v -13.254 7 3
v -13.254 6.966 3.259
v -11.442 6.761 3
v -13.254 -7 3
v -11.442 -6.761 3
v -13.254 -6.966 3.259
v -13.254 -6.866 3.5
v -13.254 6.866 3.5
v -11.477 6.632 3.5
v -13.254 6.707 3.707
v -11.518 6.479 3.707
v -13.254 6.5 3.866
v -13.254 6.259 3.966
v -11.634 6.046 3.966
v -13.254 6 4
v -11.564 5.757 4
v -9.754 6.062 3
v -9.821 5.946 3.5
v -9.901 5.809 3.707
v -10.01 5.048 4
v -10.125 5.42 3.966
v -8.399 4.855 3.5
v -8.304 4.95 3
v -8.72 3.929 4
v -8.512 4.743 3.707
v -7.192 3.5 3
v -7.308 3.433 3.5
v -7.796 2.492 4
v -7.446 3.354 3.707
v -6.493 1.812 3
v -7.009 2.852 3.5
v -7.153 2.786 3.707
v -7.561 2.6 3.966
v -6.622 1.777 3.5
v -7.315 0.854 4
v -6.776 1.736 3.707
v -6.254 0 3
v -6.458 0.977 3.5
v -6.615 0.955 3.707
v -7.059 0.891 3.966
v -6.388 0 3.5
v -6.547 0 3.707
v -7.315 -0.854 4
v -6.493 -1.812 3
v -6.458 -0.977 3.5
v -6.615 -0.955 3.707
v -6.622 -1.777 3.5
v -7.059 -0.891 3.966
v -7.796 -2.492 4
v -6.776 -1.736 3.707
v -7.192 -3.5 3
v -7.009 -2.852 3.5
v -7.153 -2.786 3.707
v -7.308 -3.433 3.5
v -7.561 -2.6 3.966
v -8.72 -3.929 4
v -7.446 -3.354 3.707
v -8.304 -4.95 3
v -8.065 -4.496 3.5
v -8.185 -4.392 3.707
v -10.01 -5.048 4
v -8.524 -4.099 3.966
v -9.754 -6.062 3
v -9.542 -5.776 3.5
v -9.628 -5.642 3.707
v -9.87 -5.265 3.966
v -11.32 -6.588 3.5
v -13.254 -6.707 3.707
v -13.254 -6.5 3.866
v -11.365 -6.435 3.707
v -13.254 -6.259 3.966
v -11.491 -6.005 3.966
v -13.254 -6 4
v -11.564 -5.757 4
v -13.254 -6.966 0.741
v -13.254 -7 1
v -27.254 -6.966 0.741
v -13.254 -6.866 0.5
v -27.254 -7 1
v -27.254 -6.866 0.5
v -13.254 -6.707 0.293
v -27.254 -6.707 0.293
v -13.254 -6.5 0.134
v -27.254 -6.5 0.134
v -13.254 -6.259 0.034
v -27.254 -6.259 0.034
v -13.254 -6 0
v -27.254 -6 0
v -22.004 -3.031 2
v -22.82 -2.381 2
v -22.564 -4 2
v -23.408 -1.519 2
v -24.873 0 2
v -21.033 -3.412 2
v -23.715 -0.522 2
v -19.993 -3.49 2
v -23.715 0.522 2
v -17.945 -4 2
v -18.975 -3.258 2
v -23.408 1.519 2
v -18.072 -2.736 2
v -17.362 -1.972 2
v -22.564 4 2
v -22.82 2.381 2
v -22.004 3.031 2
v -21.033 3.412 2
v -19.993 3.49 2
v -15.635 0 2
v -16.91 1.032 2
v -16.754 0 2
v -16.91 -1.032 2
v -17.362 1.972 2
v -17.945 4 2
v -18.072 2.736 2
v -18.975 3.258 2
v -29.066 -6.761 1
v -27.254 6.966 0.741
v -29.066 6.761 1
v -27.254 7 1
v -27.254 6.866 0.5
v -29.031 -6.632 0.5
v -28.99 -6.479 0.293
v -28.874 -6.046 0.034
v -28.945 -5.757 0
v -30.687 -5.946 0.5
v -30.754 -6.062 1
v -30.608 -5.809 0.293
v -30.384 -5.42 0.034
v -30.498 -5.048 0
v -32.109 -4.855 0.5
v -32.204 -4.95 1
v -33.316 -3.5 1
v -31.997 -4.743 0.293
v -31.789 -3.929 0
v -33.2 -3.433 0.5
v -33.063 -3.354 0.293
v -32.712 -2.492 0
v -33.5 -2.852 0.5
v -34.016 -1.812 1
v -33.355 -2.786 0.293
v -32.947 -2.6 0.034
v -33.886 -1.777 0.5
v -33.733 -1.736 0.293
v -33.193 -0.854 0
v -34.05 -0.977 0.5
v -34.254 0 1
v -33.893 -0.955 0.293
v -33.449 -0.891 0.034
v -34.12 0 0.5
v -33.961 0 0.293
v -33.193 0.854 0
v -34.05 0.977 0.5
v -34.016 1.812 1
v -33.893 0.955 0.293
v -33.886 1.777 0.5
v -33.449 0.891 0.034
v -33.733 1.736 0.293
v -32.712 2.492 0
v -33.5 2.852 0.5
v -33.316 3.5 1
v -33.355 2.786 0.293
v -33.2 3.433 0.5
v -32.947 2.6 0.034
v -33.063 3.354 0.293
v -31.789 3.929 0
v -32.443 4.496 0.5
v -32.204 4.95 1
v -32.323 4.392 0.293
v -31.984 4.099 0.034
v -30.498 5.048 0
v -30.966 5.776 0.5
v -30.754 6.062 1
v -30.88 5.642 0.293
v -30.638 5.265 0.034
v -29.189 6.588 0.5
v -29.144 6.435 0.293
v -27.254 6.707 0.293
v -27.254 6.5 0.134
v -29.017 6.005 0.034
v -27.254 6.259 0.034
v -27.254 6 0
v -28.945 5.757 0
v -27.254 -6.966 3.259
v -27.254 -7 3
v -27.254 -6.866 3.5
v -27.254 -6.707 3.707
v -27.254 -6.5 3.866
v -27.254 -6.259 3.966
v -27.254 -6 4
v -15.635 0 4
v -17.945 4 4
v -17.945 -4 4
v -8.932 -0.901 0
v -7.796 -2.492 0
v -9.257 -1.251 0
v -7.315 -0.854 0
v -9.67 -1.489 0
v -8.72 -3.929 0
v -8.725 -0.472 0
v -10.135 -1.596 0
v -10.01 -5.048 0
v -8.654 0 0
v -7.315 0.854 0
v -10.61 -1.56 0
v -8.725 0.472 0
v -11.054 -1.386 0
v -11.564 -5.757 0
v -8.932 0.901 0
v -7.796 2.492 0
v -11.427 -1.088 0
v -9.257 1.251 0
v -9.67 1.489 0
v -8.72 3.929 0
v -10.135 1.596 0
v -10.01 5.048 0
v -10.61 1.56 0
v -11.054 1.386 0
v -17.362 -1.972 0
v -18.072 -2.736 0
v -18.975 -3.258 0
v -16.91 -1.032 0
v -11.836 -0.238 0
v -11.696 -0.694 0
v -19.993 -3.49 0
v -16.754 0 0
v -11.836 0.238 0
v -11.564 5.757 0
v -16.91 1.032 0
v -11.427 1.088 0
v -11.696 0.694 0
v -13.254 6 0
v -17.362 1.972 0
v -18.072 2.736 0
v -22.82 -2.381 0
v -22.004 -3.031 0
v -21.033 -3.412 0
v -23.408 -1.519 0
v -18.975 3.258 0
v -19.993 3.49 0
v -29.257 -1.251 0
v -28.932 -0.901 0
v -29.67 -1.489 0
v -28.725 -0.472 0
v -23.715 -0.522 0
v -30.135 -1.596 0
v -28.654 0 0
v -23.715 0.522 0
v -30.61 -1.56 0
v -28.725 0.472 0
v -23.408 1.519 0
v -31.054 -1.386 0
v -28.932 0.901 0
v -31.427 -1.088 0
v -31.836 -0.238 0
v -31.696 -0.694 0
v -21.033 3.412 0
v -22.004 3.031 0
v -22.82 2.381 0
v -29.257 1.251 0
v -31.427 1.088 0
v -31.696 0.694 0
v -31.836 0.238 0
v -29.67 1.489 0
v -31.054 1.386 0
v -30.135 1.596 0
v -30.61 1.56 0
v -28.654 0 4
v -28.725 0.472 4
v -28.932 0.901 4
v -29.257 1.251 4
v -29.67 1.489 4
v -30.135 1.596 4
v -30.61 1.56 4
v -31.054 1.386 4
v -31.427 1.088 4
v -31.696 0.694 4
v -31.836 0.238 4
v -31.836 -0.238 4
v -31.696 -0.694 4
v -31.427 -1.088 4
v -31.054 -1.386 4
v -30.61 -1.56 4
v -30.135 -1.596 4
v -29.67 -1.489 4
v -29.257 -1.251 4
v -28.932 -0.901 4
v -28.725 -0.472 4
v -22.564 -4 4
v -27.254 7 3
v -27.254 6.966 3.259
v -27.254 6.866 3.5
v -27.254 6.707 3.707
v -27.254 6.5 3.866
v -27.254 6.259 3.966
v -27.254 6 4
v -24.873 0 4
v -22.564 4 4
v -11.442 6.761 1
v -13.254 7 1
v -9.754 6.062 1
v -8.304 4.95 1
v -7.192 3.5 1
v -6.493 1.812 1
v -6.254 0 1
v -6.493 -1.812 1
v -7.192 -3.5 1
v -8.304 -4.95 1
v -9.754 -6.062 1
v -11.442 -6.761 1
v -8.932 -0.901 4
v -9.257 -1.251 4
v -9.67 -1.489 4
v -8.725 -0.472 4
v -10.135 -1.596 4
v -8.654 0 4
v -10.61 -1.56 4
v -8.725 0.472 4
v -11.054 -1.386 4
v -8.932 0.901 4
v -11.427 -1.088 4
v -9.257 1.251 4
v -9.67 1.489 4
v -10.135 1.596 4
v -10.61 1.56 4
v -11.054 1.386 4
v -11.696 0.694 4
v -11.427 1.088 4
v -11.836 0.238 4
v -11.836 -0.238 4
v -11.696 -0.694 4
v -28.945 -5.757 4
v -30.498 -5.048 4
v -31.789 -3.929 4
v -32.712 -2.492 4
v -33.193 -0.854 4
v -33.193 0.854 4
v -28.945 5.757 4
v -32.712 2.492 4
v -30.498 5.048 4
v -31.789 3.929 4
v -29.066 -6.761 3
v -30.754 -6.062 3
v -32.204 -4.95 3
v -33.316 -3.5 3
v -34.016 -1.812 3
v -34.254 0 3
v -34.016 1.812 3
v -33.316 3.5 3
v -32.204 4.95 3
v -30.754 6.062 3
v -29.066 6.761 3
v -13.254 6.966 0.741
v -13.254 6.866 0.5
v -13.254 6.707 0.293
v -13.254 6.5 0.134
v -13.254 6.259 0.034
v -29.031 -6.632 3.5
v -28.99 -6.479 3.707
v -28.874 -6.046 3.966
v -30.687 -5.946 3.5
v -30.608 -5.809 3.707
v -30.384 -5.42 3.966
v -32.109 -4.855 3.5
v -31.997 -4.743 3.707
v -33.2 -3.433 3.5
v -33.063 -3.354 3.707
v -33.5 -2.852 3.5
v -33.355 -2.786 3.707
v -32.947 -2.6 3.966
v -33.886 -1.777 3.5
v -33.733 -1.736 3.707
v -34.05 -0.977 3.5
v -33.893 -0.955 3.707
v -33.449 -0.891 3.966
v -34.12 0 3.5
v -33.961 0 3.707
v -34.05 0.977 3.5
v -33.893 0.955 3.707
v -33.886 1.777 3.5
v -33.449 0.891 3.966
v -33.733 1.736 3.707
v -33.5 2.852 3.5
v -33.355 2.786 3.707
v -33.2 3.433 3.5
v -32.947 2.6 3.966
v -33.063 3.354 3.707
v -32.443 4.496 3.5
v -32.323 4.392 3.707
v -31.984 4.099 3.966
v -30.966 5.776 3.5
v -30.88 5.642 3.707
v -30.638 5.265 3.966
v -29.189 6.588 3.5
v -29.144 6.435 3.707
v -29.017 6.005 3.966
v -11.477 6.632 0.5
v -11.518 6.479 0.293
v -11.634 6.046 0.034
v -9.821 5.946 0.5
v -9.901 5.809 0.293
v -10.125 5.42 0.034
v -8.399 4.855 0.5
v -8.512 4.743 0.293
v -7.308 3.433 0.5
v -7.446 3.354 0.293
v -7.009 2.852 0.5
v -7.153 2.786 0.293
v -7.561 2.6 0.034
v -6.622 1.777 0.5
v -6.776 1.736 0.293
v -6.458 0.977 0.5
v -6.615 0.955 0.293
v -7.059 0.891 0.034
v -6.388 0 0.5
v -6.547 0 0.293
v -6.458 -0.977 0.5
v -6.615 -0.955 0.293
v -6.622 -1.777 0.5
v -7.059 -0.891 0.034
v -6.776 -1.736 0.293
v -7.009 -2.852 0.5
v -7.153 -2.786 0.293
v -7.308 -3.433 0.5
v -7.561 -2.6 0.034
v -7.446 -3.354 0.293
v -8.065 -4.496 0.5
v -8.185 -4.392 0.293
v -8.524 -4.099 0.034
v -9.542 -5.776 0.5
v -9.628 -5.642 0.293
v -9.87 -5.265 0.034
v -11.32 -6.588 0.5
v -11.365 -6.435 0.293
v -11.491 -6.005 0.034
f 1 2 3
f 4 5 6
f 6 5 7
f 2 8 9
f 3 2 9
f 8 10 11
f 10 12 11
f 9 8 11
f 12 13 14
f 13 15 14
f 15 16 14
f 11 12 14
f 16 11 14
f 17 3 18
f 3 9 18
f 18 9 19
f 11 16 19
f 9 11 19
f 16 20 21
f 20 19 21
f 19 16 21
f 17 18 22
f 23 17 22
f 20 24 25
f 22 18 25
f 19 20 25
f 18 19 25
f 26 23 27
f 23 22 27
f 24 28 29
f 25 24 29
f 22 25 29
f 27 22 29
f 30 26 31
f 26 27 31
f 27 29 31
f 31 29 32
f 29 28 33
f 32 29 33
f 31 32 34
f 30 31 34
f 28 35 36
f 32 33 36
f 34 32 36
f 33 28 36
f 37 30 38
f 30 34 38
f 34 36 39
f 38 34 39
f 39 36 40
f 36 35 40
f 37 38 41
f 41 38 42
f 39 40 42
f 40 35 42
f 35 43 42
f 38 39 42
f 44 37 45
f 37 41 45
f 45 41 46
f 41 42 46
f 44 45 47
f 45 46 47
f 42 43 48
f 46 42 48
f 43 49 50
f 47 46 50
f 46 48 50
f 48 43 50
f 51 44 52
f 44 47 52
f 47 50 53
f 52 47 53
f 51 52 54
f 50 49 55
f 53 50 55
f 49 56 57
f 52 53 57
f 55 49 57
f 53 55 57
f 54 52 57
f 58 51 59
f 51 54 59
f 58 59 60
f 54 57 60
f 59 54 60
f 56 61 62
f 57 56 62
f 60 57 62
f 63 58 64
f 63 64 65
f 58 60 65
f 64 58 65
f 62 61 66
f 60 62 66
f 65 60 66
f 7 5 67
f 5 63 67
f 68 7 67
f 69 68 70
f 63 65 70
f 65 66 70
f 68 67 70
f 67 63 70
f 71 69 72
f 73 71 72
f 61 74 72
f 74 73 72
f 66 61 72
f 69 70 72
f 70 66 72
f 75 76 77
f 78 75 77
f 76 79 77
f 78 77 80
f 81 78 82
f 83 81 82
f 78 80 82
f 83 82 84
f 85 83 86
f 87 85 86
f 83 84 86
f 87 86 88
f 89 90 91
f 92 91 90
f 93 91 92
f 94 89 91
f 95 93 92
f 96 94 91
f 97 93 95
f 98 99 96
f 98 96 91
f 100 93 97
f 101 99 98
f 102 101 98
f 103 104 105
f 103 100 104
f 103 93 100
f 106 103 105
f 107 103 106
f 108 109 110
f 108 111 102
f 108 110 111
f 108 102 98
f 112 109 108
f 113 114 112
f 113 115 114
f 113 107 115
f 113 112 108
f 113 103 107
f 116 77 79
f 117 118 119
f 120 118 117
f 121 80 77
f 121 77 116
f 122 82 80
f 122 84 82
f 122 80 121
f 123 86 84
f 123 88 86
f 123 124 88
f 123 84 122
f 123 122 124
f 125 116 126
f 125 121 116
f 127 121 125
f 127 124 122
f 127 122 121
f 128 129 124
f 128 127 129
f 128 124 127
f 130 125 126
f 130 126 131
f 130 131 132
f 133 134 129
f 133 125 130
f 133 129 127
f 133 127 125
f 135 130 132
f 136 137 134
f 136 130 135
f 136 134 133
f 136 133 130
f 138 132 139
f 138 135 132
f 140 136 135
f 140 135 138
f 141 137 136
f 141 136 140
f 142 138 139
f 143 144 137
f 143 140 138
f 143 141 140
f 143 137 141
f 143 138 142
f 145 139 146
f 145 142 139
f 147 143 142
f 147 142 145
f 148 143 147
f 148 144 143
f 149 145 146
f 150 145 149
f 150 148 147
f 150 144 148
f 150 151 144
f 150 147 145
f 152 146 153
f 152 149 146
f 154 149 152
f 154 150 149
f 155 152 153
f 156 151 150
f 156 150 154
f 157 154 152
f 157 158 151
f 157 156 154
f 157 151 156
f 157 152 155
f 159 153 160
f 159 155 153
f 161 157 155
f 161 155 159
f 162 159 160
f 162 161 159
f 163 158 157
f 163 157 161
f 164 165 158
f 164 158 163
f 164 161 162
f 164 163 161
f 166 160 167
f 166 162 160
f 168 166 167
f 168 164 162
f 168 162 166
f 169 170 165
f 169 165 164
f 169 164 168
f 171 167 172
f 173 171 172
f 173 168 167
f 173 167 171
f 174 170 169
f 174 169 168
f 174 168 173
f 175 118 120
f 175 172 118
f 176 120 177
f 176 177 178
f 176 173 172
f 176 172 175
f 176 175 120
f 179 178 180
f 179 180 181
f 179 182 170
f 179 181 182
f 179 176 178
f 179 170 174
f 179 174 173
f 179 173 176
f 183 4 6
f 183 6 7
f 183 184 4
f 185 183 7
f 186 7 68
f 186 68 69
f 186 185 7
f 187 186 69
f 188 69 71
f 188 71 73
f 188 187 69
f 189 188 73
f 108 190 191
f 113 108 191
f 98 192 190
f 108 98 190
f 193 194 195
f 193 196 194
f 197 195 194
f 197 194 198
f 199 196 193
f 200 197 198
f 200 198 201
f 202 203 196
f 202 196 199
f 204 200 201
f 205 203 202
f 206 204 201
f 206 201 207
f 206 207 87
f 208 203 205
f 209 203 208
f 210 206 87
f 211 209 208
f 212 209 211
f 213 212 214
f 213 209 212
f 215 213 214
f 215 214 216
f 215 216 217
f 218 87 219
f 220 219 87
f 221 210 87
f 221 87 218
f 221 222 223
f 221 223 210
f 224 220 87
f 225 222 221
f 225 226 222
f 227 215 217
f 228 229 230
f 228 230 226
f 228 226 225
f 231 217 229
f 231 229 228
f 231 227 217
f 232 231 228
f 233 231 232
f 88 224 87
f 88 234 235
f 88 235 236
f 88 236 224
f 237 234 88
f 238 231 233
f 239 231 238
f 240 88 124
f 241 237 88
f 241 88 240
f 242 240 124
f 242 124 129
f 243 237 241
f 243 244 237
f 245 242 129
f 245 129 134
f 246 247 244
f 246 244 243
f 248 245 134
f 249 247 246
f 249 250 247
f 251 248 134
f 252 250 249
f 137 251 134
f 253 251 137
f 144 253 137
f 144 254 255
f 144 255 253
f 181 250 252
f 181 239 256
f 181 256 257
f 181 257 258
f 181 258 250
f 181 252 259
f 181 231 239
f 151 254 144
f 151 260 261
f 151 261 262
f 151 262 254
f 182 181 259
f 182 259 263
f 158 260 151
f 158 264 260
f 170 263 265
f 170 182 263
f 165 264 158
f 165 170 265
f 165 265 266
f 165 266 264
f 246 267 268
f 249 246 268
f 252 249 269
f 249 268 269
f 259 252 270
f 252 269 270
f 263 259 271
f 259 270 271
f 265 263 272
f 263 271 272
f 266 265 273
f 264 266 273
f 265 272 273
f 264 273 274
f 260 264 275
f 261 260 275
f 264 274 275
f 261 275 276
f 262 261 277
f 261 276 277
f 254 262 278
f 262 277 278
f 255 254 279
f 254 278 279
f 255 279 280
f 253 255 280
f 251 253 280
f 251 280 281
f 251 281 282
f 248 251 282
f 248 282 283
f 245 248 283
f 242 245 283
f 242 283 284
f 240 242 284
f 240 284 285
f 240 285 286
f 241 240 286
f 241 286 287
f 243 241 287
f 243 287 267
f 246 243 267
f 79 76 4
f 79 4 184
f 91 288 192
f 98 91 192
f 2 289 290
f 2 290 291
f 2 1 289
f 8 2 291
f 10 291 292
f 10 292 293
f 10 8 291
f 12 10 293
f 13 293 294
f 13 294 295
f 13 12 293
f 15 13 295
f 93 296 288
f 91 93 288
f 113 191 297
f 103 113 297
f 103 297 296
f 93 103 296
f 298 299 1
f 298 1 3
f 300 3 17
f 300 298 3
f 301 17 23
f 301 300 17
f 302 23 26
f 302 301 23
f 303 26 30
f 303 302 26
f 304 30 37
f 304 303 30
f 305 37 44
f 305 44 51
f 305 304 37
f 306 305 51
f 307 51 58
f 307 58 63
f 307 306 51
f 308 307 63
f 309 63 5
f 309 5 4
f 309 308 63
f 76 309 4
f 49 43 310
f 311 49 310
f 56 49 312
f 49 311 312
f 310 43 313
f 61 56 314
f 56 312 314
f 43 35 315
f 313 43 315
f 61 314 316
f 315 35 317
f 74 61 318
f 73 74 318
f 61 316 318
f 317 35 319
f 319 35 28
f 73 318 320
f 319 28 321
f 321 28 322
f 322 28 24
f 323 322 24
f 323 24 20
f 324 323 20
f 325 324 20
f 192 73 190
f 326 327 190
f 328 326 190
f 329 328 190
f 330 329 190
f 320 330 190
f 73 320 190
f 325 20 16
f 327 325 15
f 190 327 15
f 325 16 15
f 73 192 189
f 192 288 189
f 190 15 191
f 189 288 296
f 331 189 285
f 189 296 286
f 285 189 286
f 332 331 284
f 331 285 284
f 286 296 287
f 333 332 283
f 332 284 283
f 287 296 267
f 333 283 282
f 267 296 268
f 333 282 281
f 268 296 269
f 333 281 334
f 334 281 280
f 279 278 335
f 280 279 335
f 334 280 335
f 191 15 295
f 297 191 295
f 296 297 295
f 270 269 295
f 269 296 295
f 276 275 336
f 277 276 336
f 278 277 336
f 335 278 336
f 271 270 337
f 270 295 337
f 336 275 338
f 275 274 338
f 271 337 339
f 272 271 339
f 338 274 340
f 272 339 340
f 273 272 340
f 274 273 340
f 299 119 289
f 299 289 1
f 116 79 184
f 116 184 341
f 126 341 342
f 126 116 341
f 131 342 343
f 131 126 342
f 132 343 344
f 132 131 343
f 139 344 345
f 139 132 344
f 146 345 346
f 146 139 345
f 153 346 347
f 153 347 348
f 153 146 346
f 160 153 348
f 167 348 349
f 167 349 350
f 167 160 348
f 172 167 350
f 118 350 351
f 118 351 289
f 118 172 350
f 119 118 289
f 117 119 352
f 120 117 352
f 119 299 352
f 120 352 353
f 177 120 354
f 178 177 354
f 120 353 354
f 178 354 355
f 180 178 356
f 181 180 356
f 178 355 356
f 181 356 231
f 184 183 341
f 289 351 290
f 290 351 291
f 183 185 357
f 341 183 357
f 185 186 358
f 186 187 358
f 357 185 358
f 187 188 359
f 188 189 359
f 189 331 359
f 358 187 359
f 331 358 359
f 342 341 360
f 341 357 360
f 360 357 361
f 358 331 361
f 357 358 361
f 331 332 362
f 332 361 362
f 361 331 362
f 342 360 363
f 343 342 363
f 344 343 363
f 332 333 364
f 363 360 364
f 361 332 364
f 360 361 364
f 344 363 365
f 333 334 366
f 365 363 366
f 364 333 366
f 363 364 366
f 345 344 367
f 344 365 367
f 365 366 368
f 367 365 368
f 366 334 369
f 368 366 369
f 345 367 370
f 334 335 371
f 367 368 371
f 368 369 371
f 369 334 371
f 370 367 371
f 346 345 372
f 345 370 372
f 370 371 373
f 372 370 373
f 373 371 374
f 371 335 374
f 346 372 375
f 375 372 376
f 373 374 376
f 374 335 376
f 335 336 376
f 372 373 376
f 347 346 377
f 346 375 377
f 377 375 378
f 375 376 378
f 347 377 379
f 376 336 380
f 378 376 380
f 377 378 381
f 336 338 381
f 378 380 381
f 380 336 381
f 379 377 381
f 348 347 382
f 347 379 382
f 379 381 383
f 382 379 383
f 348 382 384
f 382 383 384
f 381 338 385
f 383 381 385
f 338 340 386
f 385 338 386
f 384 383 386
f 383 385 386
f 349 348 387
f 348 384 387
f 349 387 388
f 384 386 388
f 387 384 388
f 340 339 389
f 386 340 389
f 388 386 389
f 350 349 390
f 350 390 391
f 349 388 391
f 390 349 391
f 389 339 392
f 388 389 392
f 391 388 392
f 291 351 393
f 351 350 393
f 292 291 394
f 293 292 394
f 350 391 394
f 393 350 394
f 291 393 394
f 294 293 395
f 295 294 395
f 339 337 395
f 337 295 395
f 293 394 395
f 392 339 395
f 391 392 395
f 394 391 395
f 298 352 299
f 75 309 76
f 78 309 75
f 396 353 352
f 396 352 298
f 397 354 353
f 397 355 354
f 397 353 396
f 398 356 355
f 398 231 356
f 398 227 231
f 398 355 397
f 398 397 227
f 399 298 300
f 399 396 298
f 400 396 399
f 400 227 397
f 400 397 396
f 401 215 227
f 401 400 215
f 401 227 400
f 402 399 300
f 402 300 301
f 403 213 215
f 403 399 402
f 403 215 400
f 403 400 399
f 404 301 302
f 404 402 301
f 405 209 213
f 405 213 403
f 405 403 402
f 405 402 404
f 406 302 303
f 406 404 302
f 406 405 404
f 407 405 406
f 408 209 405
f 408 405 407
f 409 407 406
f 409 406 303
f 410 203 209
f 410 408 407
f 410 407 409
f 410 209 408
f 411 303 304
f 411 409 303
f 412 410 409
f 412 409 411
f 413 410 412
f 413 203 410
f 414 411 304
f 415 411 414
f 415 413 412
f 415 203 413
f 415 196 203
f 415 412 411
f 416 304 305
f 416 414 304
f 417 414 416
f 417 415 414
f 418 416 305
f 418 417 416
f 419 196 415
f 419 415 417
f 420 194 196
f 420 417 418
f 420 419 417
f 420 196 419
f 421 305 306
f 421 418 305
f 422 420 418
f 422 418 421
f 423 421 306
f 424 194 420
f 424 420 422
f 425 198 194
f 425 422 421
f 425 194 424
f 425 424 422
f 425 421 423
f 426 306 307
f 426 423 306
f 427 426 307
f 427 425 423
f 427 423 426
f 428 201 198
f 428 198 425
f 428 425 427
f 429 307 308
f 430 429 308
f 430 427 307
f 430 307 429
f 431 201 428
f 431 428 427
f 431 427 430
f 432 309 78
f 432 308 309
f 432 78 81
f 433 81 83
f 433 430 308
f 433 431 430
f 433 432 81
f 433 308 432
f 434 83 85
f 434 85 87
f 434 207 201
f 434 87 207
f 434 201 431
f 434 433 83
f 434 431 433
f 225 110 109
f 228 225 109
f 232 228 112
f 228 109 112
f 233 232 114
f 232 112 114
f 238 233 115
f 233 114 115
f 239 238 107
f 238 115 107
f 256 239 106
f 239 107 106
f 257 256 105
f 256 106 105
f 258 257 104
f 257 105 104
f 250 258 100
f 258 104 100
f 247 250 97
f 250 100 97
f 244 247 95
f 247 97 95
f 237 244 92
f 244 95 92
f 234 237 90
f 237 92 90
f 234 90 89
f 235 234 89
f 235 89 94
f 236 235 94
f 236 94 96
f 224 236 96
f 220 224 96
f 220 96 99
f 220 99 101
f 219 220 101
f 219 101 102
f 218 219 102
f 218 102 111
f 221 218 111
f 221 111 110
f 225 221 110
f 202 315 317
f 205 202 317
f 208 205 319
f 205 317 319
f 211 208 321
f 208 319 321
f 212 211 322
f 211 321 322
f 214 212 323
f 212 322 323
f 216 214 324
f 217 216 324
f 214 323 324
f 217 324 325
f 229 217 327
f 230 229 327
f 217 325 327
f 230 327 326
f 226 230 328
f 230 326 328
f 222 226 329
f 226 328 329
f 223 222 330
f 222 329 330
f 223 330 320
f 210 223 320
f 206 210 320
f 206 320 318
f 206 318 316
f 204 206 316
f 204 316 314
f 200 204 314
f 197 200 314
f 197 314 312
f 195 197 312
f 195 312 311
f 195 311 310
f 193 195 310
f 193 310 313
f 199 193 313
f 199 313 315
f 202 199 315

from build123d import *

# Parameters (mm, degrees)
BOSS_EXTRU_1_DEPTH      = 4
ESQUISSE3_R             = 3.5
ESQUISSE3_R_2           = 1.6
ENL_V_MAT_EXTRU_1_DEPTH = 5
ENL_V_MAT_EXTRU_2_DEPTH = 2
CONG_1_R                = 1


with BuildPart() as part:
    # Esquisse1 → Boss.-Extru.1 (new body)
    with BuildSketch(Plane.XY):
        with BuildLine():
            Line((-27.254178511, 7), (-13.254178511, 7))
            ThreePointArc((-13.254178511, 7), (-6.254178511, 0), (-13.254178511, -7))
            Line((-13.254178511, -7), (-27.254178511, -7))
            ThreePointArc((-27.254178511, -7), (-34.254178511, 0), (-27.254178511, 7))
        make_face()
    extrude(amount=BOSS_EXTRU_1_DEPTH)

    # Esquisse3 → Enlèv. mat.-Extru.1 (cut, through all)
    with BuildSketch(Plane.XY.offset(4)):
        with Locations((-20.254178511, 0)):
            Circle(ESQUISSE3_R)
        with Locations((-30.254178511, 0)):
            Circle(ESQUISSE3_R_2)
        with Locations((-10.254178511, 0)):
            Circle(ESQUISSE3_R_2)
    extrude(amount=-ENL_V_MAT_EXTRU_1_DEPTH, mode=Mode.SUBTRACT)

    # Esquisse4 → Enlèv. mat.-Extru.2 (cut)
    with BuildSketch(Plane.XY.offset(4)):
        Polygon((-22.563579588, 4), (-24.872980665, 0), (-22.563579588, -4), (-17.944777434, -4), (-15.635376357, 0), (-17.944777434, 4), align=None)
    extrude(amount=-ENL_V_MAT_EXTRU_2_DEPTH, mode=Mode.SUBTRACT)

    # Congé1
    cong_1_edges = [part.edges().sort_by_distance(p)[0] for p in [
        (-6.254178511, 0, 4),
        (-20.254178511, 7, 4),
        (-34.254178511, 0, 4),
        (-20.254178511, 7, 0),
        (-6.254178511, 0, 0),
        (-20.254178511, -7, 0),
        (-34.254178511, 0, 0),
        (-20.254178511, -7, 4),
    ]]
    fillet(cong_1_edges, radius=CONG_1_R)


solid = part.part
